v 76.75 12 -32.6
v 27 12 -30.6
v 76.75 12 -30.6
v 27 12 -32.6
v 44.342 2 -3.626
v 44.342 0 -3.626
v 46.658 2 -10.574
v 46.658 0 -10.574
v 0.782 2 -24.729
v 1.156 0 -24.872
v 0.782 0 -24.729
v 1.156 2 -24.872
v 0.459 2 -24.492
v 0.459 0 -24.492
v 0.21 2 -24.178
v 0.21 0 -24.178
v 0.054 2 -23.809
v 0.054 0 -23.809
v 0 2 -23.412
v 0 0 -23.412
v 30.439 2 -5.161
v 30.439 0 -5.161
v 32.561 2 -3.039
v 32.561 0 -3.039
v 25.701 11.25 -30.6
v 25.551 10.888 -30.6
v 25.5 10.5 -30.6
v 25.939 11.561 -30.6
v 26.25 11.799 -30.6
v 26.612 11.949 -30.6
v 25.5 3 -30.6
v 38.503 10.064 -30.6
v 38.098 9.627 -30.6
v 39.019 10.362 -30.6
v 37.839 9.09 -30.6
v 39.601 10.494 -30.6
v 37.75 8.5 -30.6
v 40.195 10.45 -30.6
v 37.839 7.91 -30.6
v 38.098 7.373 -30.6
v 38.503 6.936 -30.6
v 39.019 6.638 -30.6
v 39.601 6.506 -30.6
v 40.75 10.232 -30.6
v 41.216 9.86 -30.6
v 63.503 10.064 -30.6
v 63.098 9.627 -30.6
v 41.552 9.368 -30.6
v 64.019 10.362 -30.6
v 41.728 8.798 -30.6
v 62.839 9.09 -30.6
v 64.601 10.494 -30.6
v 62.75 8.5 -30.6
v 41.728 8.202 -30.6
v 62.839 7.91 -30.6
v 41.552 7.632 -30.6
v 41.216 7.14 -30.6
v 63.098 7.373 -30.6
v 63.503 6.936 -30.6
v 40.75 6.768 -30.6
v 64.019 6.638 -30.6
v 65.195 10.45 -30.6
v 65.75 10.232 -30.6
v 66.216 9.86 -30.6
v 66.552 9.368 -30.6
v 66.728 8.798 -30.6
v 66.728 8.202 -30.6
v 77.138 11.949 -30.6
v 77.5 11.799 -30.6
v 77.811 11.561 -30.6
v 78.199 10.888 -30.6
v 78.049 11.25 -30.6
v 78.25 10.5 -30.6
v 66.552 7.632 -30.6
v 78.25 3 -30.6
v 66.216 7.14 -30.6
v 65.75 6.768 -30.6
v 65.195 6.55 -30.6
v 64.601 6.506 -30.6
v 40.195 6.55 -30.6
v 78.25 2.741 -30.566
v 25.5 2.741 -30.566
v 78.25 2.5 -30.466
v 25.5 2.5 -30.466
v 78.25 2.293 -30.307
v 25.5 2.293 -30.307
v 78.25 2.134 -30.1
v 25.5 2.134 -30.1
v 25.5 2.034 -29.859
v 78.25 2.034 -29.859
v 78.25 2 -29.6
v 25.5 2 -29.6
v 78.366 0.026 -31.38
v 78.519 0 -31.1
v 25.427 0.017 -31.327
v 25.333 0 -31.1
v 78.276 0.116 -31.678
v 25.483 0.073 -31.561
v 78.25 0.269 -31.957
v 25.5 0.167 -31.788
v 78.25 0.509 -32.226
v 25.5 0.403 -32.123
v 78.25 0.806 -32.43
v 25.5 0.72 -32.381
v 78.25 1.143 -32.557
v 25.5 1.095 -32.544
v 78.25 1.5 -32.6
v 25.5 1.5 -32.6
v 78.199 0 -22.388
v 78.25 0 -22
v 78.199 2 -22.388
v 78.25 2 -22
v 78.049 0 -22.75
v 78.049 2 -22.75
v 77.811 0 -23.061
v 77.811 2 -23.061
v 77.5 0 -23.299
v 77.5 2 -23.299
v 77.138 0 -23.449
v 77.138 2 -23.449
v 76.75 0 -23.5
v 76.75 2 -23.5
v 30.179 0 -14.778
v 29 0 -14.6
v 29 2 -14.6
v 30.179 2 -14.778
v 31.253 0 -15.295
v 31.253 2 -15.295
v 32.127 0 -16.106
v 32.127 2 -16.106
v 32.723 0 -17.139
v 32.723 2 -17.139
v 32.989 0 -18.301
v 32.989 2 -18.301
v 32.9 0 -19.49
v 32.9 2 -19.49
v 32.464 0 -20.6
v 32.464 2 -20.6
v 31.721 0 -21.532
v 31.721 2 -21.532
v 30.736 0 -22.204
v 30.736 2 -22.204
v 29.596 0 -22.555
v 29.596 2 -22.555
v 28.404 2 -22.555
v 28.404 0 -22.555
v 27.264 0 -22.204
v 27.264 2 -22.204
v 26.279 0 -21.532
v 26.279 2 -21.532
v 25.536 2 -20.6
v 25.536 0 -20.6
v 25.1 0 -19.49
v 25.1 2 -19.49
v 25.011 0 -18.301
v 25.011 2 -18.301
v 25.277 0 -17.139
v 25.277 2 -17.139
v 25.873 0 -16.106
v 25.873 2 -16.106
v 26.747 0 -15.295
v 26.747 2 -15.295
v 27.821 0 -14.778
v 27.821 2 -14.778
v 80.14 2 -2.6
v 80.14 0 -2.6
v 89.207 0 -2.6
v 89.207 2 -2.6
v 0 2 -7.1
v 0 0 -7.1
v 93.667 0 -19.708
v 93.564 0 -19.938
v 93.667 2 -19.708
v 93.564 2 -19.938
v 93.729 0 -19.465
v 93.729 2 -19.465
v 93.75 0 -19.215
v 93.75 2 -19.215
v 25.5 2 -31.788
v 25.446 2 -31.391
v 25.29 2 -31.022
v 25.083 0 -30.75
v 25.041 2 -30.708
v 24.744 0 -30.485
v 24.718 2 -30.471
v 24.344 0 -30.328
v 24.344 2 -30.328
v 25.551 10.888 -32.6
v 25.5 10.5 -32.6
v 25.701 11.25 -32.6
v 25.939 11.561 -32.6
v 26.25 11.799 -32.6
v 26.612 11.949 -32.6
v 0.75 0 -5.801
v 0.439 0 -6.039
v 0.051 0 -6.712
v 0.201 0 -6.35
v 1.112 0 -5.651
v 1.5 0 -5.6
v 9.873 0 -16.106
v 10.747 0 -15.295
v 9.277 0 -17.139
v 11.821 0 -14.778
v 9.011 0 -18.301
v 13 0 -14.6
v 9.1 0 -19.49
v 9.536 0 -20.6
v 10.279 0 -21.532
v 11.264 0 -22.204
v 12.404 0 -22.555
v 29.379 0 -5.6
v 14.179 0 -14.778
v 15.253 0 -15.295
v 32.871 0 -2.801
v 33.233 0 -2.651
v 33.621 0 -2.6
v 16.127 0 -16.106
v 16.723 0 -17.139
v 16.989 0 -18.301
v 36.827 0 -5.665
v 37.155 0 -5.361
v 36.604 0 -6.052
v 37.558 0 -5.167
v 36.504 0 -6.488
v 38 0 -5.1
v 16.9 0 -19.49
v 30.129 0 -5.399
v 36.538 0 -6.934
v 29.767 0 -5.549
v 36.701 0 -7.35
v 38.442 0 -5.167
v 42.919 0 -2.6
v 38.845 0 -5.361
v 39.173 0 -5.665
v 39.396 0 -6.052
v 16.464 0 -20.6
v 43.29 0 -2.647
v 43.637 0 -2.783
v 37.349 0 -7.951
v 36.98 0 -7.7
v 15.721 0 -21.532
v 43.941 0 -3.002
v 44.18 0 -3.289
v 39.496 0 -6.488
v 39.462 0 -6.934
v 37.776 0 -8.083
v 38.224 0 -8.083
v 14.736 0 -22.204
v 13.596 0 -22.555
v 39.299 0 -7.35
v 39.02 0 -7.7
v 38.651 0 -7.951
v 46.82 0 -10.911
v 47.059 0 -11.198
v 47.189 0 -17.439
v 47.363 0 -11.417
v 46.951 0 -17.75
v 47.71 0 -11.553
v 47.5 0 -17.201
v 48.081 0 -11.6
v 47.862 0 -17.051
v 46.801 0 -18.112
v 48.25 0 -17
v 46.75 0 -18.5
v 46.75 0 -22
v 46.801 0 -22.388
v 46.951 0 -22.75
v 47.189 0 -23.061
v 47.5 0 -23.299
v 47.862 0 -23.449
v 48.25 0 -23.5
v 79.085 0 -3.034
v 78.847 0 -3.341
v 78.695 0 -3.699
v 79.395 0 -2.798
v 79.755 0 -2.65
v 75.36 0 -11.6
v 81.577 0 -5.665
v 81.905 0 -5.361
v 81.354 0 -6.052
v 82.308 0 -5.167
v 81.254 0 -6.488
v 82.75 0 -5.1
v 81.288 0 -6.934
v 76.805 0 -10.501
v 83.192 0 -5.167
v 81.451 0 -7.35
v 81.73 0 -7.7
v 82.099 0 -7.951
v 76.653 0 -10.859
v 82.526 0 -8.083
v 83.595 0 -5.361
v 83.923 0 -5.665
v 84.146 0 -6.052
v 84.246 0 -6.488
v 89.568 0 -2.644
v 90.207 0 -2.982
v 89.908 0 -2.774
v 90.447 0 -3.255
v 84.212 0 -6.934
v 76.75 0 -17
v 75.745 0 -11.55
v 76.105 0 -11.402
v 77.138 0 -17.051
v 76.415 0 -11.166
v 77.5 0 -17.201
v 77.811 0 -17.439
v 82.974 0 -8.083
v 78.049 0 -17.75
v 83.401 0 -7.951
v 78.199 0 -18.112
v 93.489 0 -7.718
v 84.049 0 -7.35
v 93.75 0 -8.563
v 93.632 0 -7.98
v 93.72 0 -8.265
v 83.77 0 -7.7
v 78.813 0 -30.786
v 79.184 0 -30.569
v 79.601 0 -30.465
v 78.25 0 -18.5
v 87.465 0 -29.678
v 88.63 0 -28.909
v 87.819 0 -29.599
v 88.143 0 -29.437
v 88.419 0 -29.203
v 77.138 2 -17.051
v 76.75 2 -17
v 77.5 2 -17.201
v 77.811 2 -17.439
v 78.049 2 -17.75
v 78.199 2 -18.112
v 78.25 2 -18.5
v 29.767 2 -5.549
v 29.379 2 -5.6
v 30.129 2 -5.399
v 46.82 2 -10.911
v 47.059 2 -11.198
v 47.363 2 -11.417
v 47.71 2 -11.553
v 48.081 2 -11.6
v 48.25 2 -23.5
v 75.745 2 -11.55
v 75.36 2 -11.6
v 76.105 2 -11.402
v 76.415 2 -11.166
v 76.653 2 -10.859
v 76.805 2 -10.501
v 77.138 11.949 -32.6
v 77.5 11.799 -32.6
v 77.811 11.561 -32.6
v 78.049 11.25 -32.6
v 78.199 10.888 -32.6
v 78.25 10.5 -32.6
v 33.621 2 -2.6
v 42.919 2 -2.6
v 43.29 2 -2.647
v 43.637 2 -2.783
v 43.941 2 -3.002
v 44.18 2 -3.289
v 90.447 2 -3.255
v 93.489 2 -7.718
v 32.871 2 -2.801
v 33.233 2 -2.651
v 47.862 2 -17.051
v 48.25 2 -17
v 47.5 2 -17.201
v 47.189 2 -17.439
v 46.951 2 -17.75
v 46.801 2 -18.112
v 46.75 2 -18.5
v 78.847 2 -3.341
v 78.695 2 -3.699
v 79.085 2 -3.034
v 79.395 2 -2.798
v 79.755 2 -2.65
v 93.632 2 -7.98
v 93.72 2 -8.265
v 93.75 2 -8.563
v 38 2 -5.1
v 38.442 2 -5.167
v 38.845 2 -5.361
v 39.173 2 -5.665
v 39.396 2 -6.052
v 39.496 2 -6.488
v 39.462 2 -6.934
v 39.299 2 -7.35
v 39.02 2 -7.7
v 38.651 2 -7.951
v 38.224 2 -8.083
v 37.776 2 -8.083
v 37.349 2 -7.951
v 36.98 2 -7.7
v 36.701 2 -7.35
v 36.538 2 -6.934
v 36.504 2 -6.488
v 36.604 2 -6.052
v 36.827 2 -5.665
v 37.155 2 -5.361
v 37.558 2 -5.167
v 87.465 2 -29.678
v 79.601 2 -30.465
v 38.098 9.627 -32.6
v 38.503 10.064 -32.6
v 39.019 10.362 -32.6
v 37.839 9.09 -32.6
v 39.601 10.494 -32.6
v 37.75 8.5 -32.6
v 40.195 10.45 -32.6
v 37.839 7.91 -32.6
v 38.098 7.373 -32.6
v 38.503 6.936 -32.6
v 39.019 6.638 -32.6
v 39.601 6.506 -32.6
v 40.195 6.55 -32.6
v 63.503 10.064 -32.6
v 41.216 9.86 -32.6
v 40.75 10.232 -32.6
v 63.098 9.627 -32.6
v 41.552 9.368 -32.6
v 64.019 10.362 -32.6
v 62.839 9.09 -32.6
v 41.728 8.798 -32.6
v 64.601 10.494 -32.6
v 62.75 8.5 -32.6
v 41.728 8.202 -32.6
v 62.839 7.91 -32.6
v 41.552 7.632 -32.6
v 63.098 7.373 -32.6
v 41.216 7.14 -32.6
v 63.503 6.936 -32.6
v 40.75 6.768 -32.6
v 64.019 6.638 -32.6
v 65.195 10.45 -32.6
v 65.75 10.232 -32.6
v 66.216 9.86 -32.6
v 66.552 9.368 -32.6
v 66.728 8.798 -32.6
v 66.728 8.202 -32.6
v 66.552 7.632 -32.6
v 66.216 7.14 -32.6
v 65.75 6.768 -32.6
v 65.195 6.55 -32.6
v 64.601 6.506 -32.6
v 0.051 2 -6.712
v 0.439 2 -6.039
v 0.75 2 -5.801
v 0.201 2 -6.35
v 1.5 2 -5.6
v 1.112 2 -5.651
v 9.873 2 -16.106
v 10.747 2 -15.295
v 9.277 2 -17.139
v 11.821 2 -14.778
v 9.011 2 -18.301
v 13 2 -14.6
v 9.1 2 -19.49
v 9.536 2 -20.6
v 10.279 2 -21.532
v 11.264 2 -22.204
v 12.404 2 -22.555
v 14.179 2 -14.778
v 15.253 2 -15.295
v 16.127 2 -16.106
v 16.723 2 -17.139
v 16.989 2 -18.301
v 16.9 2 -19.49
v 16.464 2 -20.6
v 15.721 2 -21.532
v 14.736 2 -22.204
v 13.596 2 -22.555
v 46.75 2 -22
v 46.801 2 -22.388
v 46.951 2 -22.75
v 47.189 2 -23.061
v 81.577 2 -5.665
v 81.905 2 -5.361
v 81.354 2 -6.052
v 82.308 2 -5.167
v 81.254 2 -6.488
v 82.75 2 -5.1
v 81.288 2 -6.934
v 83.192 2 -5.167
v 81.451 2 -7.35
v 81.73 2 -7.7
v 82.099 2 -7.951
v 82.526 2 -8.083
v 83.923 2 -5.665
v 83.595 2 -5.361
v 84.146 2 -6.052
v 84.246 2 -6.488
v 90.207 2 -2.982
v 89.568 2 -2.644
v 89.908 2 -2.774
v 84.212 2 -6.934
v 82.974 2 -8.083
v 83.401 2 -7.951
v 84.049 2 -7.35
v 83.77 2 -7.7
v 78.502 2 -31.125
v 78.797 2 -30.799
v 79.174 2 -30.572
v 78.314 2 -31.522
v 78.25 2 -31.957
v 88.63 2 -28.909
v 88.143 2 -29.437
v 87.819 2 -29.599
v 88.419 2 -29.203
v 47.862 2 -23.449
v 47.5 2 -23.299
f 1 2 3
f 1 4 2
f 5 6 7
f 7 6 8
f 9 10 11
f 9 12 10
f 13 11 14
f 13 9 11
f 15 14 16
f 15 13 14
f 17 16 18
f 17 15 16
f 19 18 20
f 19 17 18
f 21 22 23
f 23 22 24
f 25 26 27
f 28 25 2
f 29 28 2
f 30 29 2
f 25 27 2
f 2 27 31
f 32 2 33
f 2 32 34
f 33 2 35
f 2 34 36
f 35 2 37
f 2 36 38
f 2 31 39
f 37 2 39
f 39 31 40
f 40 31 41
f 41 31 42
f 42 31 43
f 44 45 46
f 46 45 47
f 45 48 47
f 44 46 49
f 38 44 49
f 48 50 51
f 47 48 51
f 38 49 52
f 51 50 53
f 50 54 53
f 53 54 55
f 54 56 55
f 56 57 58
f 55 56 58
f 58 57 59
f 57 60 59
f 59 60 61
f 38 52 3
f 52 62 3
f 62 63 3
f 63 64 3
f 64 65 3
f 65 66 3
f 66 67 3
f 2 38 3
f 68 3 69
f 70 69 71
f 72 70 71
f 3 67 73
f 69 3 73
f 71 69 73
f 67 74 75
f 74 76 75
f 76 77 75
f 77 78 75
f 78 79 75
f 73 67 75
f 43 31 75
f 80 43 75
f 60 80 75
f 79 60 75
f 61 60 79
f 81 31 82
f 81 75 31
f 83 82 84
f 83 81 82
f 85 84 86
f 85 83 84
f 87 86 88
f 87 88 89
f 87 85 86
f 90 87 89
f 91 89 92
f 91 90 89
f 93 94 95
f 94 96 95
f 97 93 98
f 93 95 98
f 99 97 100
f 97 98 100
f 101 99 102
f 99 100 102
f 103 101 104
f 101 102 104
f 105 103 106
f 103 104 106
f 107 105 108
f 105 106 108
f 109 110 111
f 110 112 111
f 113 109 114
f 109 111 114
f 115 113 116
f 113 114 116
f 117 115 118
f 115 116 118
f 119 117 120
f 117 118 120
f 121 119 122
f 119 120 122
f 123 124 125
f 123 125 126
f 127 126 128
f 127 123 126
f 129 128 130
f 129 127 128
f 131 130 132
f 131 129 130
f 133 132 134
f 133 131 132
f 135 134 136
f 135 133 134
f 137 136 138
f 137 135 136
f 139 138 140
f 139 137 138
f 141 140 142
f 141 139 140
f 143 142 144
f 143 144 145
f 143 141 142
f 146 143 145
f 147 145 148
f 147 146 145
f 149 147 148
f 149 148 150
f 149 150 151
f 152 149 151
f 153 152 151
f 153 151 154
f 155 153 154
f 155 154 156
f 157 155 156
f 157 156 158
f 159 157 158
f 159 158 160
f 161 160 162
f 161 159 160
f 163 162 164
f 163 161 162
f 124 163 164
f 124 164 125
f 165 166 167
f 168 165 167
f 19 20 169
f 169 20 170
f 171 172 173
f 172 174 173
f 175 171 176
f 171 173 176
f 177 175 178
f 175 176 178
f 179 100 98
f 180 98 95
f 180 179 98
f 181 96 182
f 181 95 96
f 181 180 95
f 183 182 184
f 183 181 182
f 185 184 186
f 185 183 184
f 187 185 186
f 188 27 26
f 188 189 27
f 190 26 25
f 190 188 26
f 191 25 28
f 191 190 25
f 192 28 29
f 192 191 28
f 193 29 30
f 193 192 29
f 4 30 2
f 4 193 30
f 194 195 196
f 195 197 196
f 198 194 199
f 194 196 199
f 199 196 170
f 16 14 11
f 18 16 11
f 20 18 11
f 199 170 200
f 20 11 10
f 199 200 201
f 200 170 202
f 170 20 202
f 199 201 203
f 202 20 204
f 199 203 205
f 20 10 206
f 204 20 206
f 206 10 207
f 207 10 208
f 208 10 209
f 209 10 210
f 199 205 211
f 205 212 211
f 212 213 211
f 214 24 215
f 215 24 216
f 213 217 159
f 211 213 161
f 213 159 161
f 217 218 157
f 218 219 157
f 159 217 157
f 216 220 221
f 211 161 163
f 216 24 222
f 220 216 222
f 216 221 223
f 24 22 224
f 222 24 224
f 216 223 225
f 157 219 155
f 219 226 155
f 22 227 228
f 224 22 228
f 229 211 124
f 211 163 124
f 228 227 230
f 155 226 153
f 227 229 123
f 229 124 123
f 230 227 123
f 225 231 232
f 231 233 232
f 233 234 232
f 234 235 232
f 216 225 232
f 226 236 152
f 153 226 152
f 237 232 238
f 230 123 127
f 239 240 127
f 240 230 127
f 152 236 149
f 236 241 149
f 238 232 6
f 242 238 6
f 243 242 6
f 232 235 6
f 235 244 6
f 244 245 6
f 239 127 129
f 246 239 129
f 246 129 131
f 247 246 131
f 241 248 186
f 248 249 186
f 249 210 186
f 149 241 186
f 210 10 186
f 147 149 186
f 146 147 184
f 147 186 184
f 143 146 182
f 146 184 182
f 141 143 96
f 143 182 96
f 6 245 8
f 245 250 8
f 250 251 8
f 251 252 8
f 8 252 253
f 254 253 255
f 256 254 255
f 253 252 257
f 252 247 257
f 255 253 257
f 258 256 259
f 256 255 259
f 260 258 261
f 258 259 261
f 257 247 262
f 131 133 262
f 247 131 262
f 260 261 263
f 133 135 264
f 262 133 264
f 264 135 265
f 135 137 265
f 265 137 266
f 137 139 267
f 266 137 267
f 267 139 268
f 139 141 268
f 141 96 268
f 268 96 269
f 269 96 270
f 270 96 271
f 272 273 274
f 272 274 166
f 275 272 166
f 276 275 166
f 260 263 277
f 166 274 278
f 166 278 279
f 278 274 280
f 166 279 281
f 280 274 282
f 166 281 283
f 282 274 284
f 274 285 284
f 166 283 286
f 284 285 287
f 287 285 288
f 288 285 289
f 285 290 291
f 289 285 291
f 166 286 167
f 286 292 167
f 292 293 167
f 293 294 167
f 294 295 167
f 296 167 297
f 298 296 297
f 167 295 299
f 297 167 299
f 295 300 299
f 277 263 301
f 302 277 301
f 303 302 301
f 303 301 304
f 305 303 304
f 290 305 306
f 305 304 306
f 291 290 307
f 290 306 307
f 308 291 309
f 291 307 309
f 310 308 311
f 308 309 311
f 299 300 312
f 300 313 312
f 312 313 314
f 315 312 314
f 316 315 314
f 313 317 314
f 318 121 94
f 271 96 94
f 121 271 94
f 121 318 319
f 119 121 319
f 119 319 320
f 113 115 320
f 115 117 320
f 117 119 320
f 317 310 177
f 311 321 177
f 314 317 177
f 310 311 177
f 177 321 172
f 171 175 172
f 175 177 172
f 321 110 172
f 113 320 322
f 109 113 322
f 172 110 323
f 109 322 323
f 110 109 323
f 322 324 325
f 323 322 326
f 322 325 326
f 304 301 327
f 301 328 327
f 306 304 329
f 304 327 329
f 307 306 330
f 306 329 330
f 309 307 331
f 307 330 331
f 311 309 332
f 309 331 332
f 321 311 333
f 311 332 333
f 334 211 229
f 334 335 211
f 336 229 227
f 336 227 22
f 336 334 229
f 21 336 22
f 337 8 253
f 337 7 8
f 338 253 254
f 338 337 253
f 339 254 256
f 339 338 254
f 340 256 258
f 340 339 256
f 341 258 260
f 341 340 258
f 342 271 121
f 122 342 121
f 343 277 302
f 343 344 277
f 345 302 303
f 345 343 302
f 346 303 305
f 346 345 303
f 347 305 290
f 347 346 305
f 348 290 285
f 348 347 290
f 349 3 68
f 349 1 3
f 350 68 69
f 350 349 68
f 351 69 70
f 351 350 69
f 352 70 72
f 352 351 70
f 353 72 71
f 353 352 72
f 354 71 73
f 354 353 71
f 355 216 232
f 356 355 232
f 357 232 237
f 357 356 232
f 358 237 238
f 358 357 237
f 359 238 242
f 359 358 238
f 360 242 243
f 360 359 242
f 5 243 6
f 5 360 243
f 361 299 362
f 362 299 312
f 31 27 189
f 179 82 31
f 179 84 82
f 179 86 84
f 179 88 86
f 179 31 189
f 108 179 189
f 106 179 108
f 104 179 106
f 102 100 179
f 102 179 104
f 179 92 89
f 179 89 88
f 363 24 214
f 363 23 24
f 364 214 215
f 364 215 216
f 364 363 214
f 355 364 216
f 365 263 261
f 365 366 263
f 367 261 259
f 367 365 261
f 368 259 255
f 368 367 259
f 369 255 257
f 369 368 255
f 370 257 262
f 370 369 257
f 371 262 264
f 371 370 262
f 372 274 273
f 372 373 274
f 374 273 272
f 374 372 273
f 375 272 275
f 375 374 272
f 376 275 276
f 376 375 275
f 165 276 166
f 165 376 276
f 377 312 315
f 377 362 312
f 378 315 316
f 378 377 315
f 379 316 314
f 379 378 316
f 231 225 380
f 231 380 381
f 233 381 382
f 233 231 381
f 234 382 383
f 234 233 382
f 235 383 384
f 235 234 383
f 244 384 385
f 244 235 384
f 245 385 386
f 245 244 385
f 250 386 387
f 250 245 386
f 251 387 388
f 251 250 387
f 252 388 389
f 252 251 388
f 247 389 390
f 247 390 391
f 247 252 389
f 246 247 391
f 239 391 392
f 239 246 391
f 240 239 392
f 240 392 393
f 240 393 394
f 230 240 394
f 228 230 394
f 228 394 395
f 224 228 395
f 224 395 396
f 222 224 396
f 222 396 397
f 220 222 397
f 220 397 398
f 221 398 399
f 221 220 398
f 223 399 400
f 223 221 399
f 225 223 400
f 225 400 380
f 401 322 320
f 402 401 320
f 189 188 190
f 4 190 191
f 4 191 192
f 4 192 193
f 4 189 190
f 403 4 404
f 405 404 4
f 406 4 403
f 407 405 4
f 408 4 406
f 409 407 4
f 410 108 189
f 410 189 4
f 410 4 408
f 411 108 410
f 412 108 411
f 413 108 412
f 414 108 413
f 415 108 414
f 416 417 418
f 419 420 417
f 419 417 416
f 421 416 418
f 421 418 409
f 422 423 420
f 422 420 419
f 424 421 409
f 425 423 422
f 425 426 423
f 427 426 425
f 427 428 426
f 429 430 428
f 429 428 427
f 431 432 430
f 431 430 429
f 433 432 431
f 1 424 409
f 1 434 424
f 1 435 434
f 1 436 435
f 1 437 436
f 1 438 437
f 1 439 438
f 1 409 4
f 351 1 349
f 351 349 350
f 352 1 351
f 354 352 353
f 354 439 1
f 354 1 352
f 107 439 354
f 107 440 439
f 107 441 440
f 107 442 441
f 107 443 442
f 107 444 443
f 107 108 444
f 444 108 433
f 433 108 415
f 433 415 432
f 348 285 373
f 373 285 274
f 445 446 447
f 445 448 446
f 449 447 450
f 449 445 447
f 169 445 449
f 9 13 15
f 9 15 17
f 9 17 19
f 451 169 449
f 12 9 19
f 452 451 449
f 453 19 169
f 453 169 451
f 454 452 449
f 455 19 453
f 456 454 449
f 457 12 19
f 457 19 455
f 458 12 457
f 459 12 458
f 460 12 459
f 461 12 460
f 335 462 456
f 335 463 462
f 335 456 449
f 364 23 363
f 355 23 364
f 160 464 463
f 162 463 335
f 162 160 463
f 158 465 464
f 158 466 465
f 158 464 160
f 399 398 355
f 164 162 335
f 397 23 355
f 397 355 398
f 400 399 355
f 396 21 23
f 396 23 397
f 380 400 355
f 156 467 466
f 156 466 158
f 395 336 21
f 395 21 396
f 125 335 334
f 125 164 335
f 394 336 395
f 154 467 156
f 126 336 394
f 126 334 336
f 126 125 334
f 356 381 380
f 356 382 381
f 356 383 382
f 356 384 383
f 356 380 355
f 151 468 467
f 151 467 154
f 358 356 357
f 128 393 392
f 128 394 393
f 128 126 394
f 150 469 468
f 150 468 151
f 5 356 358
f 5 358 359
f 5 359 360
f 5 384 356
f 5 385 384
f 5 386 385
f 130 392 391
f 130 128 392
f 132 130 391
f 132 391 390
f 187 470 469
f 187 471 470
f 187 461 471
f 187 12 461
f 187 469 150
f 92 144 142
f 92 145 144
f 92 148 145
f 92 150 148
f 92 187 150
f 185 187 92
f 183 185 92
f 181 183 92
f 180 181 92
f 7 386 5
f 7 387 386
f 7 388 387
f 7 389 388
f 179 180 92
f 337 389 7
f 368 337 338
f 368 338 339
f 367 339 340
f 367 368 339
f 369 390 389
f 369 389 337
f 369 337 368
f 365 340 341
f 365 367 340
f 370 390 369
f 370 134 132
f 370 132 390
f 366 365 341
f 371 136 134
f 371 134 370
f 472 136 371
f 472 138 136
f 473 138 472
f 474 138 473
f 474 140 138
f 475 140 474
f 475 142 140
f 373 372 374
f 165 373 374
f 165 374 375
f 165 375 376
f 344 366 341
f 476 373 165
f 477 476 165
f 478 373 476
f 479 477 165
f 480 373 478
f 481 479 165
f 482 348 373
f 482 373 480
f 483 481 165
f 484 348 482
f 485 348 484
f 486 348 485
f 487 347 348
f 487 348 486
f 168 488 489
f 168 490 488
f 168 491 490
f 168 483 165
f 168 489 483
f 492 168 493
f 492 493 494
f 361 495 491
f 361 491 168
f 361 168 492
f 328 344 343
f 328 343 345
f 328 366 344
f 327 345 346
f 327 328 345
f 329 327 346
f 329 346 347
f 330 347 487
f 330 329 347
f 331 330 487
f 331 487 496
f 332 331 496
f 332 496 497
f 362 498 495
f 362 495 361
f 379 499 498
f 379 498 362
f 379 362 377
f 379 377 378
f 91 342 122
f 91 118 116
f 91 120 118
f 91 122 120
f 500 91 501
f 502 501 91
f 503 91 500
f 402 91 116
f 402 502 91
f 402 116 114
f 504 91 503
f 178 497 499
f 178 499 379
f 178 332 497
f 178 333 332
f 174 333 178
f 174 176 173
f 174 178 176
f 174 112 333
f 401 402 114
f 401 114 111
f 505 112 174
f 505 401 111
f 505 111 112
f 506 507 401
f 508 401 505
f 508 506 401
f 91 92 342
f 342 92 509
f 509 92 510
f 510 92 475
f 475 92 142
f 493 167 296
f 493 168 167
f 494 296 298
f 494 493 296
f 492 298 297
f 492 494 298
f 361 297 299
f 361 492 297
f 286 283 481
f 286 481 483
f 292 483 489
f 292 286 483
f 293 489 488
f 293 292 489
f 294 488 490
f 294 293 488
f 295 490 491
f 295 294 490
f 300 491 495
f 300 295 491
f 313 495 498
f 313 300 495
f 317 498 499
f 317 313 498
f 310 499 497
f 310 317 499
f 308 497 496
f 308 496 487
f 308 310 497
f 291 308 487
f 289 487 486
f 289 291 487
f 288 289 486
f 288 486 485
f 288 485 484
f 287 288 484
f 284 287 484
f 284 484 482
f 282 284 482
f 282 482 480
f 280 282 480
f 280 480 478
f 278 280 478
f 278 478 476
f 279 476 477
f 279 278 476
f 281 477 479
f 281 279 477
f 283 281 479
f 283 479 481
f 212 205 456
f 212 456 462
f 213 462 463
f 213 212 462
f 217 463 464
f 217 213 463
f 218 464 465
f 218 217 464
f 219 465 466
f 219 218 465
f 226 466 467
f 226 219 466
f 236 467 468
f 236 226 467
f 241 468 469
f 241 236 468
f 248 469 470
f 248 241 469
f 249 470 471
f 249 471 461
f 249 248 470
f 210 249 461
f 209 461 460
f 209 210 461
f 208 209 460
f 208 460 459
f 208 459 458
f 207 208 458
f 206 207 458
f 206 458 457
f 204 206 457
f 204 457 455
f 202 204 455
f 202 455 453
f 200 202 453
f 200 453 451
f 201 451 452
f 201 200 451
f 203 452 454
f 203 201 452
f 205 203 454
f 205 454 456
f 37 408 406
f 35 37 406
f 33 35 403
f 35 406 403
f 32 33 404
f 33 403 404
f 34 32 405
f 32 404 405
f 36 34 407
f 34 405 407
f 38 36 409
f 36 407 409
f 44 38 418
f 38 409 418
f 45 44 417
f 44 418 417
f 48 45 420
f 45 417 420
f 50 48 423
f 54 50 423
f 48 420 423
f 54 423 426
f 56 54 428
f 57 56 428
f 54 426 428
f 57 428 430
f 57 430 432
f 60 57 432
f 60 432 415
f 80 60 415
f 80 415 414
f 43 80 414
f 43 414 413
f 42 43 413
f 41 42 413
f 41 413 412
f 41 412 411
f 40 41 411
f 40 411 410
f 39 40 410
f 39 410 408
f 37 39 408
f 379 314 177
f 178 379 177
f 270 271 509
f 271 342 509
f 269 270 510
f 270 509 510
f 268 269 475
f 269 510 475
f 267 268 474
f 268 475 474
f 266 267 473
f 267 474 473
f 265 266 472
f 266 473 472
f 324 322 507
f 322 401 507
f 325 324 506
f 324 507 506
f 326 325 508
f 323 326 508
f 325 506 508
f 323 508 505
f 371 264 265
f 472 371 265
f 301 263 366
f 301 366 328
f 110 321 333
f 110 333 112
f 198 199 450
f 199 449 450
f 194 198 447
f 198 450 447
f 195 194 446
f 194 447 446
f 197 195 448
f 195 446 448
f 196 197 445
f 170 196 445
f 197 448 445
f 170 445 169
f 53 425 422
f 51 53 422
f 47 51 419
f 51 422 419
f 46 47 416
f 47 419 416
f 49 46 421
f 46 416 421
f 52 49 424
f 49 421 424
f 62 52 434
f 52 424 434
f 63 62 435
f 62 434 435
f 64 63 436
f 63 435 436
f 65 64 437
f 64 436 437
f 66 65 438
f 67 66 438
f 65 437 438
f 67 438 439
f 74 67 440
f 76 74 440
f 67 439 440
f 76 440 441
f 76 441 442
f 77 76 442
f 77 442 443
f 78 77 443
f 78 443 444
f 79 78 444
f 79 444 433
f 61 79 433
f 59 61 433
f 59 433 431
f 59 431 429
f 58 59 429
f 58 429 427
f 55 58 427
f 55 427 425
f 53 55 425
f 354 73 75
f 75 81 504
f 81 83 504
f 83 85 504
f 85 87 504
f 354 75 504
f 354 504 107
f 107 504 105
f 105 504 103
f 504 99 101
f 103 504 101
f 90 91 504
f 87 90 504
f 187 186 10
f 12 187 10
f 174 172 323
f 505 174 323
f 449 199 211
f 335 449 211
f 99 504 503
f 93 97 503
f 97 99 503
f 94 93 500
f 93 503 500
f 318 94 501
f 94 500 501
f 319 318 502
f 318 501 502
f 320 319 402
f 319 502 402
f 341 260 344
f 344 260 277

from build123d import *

# Parameters (mm, degrees)
SKETCH1_R           = 1.5
SKETCH1_R_2         = 4
SKETCH1_W           = 31.5
SKETCH1_H           = 6.5
BOSS_EXTRUDE1_DEPTH = 2
SKETCH2_W           = 52.75
SKETCH2_H           = 2
BOSS_EXTRUDE2_DEPTH = 10
SKETCH3_R           = 2
CUT_EXTRUDE1_DEPTH  = 100.1617996
FILLET1_R           = 1.5
FILLET2_R           = 1
FILLET3_R           = 1.5


with BuildPart() as part:
    # Sketch1 → Boss-Extrude1 (new body)
    with BuildSketch(Plane(origin=(0, 0, 0), x_dir=(1, 0, 0), z_dir=(0, 1, 0))):
        Polygon((0, 5.6), (30, 5.6), (33, 2.6), (44, 2.6), (47, 11.6), (76.5, 11.6), (79, 2.6), (90, 2.6), (93.75, 8.1), (93.75, 19.6), (88.25, 29.6), (78.25, 30.6), (78.25, 32.6), (25.5, 32.6), (25.5, 30.6), (0, 24.6), align=None)
        with Locations(Location((82.75, 6.6, 0), (0, 0, 270))):
            Circle(SKETCH1_R, mode=Mode.SUBTRACT)
        with Locations(Location((38, 6.6, 0), (0, 0, 270))):
            Circle(SKETCH1_R, mode=Mode.SUBTRACT)
        with Locations(Location((13, 18.6, 0), (0, 0, 270))):
            Circle(SKETCH1_R_2, mode=Mode.SUBTRACT)
        with Locations(Location((29, 18.6, 0), (0, 0, 270))):
            Circle(SKETCH1_R_2, mode=Mode.SUBTRACT)
        with Locations((62.5, 20.25)):
            Rectangle(SKETCH1_W, SKETCH1_H, mode=Mode.SUBTRACT)
    extrude(amount=BOSS_EXTRUDE1_DEPTH)

    # Sketch2 → Boss-Extrude2 (add)
    with BuildSketch(Plane(origin=(0, 2, 0), x_dir=(1, 0, 0), z_dir=(0, 1, 0))):
        with Locations((51.875, 31.6)):
            Rectangle(SKETCH2_W, SKETCH2_H)
    extrude(amount=BOSS_EXTRUDE2_DEPTH)

    # Sketch3 → Cut-Extrude1 (cut, through all)
    with BuildSketch(Plane(origin=(0, 0, -32.6), x_dir=(-1, 0, 0), z_dir=(0, 0, -1))):
        with Locations((-64.75, 8.5)):
            Circle(SKETCH3_R)
        with Locations((-39.75, 8.5)):
            Circle(SKETCH3_R)
    extrude(amount=-CUT_EXTRUDE1_DEPTH, mode=Mode.SUBTRACT)

    # Fillet1
    fillet1_edges = [part.edges().sort_by_distance(p)[0] for p in [
        (46.75, 1, -17),
        (46.75, 1, -23.5),
        (0, 1, -24.6),
        (25.5, 1, -30.6),
        (25.5, 12, -31.6),
        (78.25, 1, -17),
        (78.25, 1, -23.5),
        (0, 1, -5.6),
        (30, 1, -5.6),
        (33, 1, -2.6),
        (44, 1, -2.6),
        (47, 1, -11.6),
        (76.5, 1, -11.6),
        (79, 1, -2.6),
        (90, 1, -2.6),
        (93.75, 1, -8.1),
        (93.75, 1, -19.6),
        (88.25, 1, -29.6),
        (78.25, 1, -30.6),
        (78.25, 12, -31.6),
    ]]
    fillet(fillet1_edges, radius=FILLET1_R)

    # Fillet2
    fillet2_edges = [part.edges().sort_by_distance(p)[0] for p in [
        (51.875, 2, -30.6),
    ]]
    fillet(fillet2_edges, radius=FILLET2_R)

    # Fillet3
    fillet3_edges = [part.edges().sort_by_distance(p)[0] for p in [
        (51.875, 0, -32.6),
    ]]
    fillet(fillet3_edges, radius=FILLET3_R)


solid = part.part
